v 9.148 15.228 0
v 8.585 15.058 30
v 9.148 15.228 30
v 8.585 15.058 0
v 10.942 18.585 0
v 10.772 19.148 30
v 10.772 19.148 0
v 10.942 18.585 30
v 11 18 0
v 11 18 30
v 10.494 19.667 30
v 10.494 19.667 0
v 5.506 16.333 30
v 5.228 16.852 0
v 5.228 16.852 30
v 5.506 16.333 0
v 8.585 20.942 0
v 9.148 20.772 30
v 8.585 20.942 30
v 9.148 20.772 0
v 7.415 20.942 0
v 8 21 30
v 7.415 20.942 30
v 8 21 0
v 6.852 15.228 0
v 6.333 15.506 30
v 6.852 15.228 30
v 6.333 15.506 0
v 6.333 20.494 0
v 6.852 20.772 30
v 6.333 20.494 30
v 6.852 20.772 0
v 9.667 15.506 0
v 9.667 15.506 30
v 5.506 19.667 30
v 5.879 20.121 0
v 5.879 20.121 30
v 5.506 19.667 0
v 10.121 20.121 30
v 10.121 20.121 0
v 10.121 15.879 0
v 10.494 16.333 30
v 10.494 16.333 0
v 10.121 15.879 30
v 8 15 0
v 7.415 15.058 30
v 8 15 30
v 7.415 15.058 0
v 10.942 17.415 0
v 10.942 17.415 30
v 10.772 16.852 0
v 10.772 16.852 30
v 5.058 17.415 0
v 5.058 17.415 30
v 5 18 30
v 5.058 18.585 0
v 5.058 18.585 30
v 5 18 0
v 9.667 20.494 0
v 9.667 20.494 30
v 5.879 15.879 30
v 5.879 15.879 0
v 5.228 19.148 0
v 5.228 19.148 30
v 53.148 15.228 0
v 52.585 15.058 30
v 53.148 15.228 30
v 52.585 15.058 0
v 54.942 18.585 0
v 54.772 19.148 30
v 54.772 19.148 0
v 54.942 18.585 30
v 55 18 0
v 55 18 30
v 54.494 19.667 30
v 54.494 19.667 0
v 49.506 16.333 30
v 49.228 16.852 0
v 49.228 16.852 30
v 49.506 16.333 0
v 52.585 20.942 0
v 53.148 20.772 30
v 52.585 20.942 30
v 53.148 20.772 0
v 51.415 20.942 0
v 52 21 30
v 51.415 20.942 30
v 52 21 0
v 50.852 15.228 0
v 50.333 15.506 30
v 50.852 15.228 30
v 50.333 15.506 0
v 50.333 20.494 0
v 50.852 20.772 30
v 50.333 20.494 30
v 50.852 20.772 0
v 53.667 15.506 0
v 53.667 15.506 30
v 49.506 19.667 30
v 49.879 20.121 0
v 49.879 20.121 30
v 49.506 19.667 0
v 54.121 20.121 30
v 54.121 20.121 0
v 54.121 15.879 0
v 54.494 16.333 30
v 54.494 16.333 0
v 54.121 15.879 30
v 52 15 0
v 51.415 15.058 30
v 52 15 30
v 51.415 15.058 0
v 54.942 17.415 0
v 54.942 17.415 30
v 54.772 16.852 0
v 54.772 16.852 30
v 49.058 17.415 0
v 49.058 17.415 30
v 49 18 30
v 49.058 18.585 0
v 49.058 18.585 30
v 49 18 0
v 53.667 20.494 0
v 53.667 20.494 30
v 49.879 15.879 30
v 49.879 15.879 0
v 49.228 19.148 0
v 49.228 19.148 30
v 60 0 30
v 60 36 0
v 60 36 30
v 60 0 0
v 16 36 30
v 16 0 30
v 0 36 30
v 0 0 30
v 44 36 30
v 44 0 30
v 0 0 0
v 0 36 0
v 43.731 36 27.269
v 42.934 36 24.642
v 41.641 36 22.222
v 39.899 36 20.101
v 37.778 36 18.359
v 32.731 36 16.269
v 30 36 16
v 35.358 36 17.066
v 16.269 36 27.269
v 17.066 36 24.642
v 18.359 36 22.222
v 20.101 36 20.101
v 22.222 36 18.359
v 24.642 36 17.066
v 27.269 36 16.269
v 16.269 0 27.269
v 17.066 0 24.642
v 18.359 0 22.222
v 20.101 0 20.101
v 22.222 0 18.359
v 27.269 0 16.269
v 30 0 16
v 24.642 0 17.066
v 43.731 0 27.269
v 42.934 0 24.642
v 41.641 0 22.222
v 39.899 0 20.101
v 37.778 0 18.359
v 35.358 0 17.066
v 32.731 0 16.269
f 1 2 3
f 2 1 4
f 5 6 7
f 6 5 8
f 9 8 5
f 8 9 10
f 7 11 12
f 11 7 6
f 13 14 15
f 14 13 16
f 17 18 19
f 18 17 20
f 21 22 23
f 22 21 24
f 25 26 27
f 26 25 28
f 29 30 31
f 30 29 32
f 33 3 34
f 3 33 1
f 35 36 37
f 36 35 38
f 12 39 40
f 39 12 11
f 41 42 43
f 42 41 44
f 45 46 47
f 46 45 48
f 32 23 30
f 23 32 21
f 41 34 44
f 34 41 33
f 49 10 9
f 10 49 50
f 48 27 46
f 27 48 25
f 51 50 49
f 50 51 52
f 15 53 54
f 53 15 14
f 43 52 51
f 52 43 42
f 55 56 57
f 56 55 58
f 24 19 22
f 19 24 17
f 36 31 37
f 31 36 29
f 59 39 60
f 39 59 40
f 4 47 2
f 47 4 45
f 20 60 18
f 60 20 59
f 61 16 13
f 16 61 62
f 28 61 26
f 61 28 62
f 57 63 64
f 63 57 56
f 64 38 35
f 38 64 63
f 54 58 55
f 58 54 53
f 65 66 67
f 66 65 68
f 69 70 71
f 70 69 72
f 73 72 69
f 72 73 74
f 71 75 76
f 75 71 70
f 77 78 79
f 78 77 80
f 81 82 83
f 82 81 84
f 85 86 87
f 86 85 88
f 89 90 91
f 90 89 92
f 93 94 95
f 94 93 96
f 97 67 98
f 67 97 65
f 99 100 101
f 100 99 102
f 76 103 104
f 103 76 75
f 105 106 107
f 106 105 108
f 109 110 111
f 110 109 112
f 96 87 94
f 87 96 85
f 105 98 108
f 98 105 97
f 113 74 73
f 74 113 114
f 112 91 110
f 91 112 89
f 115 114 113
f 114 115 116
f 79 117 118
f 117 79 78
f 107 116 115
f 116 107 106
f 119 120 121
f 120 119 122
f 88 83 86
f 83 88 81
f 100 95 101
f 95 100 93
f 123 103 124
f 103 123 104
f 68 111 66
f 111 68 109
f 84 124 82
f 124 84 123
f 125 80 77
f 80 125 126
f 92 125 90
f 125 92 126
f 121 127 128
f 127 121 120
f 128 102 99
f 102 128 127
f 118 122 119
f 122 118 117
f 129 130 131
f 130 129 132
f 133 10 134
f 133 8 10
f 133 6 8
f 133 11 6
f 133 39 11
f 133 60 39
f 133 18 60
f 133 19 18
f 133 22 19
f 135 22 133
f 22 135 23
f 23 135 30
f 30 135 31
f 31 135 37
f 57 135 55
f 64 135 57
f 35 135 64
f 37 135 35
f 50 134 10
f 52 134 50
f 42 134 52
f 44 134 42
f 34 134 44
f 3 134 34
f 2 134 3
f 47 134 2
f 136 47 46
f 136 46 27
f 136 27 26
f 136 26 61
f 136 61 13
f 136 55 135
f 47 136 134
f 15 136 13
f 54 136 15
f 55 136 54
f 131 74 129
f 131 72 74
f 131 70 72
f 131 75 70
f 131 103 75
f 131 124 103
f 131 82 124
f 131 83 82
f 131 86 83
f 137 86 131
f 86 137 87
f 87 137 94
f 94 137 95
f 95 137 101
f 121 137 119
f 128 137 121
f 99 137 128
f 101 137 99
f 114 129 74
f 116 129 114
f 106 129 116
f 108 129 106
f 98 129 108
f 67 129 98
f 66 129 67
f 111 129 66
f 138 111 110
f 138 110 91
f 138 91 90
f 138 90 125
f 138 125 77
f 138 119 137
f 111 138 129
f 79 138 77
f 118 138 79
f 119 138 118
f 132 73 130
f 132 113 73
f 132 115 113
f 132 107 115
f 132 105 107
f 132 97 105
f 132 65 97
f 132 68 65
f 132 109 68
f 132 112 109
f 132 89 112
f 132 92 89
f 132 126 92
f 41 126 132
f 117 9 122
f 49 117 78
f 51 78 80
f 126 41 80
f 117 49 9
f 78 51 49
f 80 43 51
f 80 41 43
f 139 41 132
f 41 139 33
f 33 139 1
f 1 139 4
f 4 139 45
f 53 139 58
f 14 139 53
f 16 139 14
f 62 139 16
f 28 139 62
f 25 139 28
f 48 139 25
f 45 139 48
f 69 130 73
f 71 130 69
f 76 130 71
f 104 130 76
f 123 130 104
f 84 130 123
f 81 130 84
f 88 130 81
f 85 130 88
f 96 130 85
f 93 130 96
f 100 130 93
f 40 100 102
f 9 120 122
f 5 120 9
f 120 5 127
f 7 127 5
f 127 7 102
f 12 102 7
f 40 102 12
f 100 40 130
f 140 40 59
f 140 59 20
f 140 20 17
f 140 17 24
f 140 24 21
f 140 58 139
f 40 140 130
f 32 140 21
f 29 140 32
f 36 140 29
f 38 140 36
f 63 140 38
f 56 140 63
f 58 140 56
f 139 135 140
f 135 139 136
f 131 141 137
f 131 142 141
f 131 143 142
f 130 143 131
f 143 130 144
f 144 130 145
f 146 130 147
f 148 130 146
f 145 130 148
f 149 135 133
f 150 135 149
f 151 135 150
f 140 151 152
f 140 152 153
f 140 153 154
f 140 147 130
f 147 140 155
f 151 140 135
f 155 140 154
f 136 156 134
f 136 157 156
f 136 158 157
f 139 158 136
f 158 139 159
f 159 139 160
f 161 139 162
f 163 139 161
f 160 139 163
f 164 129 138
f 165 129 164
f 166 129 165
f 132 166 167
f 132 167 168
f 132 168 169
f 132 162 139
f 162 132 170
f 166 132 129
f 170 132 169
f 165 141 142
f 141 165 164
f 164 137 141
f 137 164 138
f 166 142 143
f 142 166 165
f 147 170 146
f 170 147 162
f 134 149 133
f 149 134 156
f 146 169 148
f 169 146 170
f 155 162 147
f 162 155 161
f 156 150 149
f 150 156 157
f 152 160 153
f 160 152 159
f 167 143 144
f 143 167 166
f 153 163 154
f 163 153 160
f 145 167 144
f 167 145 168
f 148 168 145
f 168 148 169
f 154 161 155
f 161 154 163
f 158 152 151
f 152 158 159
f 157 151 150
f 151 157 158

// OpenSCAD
$fn = 32;

// ----------------------------------------------------------------------
// Saddle clamp: plain shaft clamp
// ----------------------------------------------------------------------

// --- parameters (mm) ---
blk_l = 60;               // block length, X
blk_w = 36;               // block width, Y
blk_h = 30;               // block height
clamp_r = 14;             // shaft groove radius
hole_r = 3;               // bolt hole radius
hole_m = 8;               // bolt hole margin from the ends
fit_tol = 0.05;           // tolerance for press fits, mm
free_tol = 0.3;           // tolerance for clearance fits, mm

saw_depth = clamp_r + 3;  // saw kerf depth

difference() {
  cube([blk_l, blk_w, blk_h]);
  translate([blk_l / 2, -1, blk_h])
    rotate([-90, 0, 0])
      cylinder(h = blk_w + 2, r = clamp_r);
  for (sx = [0, 1])
    translate([sx ? blk_l - hole_m : hole_m, blk_w / 2, -1])
      cylinder(r = hole_r, h = blk_h + 2);
}
